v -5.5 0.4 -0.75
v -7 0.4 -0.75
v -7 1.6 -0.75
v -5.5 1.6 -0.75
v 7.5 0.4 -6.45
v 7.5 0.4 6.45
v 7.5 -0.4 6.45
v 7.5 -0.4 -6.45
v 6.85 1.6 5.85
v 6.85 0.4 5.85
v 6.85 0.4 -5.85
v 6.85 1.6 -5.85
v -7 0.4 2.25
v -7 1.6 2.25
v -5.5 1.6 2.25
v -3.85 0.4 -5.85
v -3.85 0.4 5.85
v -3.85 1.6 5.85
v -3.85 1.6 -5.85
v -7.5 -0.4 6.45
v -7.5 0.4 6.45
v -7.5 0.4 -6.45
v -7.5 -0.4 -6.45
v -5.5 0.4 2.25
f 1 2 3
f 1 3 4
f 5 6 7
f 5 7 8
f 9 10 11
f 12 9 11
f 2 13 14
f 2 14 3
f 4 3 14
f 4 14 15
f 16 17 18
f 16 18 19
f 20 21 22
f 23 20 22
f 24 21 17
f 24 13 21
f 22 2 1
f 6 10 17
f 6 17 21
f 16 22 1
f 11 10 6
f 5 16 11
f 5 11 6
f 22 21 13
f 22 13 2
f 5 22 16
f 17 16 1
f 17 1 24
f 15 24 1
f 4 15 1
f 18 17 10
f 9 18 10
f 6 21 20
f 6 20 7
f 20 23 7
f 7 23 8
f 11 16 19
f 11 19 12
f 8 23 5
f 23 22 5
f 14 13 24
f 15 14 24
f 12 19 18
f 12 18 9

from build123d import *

# Parameters (mm, degrees)
SKETCH1_W           = 15
SKETCH1_H           = 12.9
BOSS_EXTRUDE1_DEPTH = 0.4
SKETCH2_W           = 10.7
SKETCH2_H           = 11.7
BOSS_EXTRUDE2_DEPTH = 1.2
SKETCH3_W           = 1.5
SKETCH3_H           = 3
BOSS_EXTRUDE3_DEPTH = 1.2


with BuildPart() as part:
    # Sketch1 → Boss-Extrude1 (new body, symmetric)
    with BuildSketch(Plane(origin=(0, 0, 0), x_dir=(1, 0, 0), z_dir=(0, 1, 0))):
        Rectangle(SKETCH1_W, SKETCH1_H)
    extrude(amount=BOSS_EXTRUDE1_DEPTH, both=True)

    # Sketch2 → Boss-Extrude2 (add)
    with BuildSketch(Plane(origin=(0, 0.4, 0), x_dir=(1, 0, 0), z_dir=(0, 1, 0))):
        with Locations((1.5, 0)):
            Rectangle(SKETCH2_W, SKETCH2_H)
    extrude(amount=BOSS_EXTRUDE2_DEPTH)

    # Sketch3 → Boss-Extrude3 (add)
    with BuildSketch(Plane(origin=(0, 0.4, 0), x_dir=(1, 0, 0), z_dir=(0, 1, 0))):
        with Locations((-6.25, -0.75)):
            Rectangle(SKETCH3_W, SKETCH3_H)
    extrude(amount=BOSS_EXTRUDE3_DEPTH)


solid = part.part
